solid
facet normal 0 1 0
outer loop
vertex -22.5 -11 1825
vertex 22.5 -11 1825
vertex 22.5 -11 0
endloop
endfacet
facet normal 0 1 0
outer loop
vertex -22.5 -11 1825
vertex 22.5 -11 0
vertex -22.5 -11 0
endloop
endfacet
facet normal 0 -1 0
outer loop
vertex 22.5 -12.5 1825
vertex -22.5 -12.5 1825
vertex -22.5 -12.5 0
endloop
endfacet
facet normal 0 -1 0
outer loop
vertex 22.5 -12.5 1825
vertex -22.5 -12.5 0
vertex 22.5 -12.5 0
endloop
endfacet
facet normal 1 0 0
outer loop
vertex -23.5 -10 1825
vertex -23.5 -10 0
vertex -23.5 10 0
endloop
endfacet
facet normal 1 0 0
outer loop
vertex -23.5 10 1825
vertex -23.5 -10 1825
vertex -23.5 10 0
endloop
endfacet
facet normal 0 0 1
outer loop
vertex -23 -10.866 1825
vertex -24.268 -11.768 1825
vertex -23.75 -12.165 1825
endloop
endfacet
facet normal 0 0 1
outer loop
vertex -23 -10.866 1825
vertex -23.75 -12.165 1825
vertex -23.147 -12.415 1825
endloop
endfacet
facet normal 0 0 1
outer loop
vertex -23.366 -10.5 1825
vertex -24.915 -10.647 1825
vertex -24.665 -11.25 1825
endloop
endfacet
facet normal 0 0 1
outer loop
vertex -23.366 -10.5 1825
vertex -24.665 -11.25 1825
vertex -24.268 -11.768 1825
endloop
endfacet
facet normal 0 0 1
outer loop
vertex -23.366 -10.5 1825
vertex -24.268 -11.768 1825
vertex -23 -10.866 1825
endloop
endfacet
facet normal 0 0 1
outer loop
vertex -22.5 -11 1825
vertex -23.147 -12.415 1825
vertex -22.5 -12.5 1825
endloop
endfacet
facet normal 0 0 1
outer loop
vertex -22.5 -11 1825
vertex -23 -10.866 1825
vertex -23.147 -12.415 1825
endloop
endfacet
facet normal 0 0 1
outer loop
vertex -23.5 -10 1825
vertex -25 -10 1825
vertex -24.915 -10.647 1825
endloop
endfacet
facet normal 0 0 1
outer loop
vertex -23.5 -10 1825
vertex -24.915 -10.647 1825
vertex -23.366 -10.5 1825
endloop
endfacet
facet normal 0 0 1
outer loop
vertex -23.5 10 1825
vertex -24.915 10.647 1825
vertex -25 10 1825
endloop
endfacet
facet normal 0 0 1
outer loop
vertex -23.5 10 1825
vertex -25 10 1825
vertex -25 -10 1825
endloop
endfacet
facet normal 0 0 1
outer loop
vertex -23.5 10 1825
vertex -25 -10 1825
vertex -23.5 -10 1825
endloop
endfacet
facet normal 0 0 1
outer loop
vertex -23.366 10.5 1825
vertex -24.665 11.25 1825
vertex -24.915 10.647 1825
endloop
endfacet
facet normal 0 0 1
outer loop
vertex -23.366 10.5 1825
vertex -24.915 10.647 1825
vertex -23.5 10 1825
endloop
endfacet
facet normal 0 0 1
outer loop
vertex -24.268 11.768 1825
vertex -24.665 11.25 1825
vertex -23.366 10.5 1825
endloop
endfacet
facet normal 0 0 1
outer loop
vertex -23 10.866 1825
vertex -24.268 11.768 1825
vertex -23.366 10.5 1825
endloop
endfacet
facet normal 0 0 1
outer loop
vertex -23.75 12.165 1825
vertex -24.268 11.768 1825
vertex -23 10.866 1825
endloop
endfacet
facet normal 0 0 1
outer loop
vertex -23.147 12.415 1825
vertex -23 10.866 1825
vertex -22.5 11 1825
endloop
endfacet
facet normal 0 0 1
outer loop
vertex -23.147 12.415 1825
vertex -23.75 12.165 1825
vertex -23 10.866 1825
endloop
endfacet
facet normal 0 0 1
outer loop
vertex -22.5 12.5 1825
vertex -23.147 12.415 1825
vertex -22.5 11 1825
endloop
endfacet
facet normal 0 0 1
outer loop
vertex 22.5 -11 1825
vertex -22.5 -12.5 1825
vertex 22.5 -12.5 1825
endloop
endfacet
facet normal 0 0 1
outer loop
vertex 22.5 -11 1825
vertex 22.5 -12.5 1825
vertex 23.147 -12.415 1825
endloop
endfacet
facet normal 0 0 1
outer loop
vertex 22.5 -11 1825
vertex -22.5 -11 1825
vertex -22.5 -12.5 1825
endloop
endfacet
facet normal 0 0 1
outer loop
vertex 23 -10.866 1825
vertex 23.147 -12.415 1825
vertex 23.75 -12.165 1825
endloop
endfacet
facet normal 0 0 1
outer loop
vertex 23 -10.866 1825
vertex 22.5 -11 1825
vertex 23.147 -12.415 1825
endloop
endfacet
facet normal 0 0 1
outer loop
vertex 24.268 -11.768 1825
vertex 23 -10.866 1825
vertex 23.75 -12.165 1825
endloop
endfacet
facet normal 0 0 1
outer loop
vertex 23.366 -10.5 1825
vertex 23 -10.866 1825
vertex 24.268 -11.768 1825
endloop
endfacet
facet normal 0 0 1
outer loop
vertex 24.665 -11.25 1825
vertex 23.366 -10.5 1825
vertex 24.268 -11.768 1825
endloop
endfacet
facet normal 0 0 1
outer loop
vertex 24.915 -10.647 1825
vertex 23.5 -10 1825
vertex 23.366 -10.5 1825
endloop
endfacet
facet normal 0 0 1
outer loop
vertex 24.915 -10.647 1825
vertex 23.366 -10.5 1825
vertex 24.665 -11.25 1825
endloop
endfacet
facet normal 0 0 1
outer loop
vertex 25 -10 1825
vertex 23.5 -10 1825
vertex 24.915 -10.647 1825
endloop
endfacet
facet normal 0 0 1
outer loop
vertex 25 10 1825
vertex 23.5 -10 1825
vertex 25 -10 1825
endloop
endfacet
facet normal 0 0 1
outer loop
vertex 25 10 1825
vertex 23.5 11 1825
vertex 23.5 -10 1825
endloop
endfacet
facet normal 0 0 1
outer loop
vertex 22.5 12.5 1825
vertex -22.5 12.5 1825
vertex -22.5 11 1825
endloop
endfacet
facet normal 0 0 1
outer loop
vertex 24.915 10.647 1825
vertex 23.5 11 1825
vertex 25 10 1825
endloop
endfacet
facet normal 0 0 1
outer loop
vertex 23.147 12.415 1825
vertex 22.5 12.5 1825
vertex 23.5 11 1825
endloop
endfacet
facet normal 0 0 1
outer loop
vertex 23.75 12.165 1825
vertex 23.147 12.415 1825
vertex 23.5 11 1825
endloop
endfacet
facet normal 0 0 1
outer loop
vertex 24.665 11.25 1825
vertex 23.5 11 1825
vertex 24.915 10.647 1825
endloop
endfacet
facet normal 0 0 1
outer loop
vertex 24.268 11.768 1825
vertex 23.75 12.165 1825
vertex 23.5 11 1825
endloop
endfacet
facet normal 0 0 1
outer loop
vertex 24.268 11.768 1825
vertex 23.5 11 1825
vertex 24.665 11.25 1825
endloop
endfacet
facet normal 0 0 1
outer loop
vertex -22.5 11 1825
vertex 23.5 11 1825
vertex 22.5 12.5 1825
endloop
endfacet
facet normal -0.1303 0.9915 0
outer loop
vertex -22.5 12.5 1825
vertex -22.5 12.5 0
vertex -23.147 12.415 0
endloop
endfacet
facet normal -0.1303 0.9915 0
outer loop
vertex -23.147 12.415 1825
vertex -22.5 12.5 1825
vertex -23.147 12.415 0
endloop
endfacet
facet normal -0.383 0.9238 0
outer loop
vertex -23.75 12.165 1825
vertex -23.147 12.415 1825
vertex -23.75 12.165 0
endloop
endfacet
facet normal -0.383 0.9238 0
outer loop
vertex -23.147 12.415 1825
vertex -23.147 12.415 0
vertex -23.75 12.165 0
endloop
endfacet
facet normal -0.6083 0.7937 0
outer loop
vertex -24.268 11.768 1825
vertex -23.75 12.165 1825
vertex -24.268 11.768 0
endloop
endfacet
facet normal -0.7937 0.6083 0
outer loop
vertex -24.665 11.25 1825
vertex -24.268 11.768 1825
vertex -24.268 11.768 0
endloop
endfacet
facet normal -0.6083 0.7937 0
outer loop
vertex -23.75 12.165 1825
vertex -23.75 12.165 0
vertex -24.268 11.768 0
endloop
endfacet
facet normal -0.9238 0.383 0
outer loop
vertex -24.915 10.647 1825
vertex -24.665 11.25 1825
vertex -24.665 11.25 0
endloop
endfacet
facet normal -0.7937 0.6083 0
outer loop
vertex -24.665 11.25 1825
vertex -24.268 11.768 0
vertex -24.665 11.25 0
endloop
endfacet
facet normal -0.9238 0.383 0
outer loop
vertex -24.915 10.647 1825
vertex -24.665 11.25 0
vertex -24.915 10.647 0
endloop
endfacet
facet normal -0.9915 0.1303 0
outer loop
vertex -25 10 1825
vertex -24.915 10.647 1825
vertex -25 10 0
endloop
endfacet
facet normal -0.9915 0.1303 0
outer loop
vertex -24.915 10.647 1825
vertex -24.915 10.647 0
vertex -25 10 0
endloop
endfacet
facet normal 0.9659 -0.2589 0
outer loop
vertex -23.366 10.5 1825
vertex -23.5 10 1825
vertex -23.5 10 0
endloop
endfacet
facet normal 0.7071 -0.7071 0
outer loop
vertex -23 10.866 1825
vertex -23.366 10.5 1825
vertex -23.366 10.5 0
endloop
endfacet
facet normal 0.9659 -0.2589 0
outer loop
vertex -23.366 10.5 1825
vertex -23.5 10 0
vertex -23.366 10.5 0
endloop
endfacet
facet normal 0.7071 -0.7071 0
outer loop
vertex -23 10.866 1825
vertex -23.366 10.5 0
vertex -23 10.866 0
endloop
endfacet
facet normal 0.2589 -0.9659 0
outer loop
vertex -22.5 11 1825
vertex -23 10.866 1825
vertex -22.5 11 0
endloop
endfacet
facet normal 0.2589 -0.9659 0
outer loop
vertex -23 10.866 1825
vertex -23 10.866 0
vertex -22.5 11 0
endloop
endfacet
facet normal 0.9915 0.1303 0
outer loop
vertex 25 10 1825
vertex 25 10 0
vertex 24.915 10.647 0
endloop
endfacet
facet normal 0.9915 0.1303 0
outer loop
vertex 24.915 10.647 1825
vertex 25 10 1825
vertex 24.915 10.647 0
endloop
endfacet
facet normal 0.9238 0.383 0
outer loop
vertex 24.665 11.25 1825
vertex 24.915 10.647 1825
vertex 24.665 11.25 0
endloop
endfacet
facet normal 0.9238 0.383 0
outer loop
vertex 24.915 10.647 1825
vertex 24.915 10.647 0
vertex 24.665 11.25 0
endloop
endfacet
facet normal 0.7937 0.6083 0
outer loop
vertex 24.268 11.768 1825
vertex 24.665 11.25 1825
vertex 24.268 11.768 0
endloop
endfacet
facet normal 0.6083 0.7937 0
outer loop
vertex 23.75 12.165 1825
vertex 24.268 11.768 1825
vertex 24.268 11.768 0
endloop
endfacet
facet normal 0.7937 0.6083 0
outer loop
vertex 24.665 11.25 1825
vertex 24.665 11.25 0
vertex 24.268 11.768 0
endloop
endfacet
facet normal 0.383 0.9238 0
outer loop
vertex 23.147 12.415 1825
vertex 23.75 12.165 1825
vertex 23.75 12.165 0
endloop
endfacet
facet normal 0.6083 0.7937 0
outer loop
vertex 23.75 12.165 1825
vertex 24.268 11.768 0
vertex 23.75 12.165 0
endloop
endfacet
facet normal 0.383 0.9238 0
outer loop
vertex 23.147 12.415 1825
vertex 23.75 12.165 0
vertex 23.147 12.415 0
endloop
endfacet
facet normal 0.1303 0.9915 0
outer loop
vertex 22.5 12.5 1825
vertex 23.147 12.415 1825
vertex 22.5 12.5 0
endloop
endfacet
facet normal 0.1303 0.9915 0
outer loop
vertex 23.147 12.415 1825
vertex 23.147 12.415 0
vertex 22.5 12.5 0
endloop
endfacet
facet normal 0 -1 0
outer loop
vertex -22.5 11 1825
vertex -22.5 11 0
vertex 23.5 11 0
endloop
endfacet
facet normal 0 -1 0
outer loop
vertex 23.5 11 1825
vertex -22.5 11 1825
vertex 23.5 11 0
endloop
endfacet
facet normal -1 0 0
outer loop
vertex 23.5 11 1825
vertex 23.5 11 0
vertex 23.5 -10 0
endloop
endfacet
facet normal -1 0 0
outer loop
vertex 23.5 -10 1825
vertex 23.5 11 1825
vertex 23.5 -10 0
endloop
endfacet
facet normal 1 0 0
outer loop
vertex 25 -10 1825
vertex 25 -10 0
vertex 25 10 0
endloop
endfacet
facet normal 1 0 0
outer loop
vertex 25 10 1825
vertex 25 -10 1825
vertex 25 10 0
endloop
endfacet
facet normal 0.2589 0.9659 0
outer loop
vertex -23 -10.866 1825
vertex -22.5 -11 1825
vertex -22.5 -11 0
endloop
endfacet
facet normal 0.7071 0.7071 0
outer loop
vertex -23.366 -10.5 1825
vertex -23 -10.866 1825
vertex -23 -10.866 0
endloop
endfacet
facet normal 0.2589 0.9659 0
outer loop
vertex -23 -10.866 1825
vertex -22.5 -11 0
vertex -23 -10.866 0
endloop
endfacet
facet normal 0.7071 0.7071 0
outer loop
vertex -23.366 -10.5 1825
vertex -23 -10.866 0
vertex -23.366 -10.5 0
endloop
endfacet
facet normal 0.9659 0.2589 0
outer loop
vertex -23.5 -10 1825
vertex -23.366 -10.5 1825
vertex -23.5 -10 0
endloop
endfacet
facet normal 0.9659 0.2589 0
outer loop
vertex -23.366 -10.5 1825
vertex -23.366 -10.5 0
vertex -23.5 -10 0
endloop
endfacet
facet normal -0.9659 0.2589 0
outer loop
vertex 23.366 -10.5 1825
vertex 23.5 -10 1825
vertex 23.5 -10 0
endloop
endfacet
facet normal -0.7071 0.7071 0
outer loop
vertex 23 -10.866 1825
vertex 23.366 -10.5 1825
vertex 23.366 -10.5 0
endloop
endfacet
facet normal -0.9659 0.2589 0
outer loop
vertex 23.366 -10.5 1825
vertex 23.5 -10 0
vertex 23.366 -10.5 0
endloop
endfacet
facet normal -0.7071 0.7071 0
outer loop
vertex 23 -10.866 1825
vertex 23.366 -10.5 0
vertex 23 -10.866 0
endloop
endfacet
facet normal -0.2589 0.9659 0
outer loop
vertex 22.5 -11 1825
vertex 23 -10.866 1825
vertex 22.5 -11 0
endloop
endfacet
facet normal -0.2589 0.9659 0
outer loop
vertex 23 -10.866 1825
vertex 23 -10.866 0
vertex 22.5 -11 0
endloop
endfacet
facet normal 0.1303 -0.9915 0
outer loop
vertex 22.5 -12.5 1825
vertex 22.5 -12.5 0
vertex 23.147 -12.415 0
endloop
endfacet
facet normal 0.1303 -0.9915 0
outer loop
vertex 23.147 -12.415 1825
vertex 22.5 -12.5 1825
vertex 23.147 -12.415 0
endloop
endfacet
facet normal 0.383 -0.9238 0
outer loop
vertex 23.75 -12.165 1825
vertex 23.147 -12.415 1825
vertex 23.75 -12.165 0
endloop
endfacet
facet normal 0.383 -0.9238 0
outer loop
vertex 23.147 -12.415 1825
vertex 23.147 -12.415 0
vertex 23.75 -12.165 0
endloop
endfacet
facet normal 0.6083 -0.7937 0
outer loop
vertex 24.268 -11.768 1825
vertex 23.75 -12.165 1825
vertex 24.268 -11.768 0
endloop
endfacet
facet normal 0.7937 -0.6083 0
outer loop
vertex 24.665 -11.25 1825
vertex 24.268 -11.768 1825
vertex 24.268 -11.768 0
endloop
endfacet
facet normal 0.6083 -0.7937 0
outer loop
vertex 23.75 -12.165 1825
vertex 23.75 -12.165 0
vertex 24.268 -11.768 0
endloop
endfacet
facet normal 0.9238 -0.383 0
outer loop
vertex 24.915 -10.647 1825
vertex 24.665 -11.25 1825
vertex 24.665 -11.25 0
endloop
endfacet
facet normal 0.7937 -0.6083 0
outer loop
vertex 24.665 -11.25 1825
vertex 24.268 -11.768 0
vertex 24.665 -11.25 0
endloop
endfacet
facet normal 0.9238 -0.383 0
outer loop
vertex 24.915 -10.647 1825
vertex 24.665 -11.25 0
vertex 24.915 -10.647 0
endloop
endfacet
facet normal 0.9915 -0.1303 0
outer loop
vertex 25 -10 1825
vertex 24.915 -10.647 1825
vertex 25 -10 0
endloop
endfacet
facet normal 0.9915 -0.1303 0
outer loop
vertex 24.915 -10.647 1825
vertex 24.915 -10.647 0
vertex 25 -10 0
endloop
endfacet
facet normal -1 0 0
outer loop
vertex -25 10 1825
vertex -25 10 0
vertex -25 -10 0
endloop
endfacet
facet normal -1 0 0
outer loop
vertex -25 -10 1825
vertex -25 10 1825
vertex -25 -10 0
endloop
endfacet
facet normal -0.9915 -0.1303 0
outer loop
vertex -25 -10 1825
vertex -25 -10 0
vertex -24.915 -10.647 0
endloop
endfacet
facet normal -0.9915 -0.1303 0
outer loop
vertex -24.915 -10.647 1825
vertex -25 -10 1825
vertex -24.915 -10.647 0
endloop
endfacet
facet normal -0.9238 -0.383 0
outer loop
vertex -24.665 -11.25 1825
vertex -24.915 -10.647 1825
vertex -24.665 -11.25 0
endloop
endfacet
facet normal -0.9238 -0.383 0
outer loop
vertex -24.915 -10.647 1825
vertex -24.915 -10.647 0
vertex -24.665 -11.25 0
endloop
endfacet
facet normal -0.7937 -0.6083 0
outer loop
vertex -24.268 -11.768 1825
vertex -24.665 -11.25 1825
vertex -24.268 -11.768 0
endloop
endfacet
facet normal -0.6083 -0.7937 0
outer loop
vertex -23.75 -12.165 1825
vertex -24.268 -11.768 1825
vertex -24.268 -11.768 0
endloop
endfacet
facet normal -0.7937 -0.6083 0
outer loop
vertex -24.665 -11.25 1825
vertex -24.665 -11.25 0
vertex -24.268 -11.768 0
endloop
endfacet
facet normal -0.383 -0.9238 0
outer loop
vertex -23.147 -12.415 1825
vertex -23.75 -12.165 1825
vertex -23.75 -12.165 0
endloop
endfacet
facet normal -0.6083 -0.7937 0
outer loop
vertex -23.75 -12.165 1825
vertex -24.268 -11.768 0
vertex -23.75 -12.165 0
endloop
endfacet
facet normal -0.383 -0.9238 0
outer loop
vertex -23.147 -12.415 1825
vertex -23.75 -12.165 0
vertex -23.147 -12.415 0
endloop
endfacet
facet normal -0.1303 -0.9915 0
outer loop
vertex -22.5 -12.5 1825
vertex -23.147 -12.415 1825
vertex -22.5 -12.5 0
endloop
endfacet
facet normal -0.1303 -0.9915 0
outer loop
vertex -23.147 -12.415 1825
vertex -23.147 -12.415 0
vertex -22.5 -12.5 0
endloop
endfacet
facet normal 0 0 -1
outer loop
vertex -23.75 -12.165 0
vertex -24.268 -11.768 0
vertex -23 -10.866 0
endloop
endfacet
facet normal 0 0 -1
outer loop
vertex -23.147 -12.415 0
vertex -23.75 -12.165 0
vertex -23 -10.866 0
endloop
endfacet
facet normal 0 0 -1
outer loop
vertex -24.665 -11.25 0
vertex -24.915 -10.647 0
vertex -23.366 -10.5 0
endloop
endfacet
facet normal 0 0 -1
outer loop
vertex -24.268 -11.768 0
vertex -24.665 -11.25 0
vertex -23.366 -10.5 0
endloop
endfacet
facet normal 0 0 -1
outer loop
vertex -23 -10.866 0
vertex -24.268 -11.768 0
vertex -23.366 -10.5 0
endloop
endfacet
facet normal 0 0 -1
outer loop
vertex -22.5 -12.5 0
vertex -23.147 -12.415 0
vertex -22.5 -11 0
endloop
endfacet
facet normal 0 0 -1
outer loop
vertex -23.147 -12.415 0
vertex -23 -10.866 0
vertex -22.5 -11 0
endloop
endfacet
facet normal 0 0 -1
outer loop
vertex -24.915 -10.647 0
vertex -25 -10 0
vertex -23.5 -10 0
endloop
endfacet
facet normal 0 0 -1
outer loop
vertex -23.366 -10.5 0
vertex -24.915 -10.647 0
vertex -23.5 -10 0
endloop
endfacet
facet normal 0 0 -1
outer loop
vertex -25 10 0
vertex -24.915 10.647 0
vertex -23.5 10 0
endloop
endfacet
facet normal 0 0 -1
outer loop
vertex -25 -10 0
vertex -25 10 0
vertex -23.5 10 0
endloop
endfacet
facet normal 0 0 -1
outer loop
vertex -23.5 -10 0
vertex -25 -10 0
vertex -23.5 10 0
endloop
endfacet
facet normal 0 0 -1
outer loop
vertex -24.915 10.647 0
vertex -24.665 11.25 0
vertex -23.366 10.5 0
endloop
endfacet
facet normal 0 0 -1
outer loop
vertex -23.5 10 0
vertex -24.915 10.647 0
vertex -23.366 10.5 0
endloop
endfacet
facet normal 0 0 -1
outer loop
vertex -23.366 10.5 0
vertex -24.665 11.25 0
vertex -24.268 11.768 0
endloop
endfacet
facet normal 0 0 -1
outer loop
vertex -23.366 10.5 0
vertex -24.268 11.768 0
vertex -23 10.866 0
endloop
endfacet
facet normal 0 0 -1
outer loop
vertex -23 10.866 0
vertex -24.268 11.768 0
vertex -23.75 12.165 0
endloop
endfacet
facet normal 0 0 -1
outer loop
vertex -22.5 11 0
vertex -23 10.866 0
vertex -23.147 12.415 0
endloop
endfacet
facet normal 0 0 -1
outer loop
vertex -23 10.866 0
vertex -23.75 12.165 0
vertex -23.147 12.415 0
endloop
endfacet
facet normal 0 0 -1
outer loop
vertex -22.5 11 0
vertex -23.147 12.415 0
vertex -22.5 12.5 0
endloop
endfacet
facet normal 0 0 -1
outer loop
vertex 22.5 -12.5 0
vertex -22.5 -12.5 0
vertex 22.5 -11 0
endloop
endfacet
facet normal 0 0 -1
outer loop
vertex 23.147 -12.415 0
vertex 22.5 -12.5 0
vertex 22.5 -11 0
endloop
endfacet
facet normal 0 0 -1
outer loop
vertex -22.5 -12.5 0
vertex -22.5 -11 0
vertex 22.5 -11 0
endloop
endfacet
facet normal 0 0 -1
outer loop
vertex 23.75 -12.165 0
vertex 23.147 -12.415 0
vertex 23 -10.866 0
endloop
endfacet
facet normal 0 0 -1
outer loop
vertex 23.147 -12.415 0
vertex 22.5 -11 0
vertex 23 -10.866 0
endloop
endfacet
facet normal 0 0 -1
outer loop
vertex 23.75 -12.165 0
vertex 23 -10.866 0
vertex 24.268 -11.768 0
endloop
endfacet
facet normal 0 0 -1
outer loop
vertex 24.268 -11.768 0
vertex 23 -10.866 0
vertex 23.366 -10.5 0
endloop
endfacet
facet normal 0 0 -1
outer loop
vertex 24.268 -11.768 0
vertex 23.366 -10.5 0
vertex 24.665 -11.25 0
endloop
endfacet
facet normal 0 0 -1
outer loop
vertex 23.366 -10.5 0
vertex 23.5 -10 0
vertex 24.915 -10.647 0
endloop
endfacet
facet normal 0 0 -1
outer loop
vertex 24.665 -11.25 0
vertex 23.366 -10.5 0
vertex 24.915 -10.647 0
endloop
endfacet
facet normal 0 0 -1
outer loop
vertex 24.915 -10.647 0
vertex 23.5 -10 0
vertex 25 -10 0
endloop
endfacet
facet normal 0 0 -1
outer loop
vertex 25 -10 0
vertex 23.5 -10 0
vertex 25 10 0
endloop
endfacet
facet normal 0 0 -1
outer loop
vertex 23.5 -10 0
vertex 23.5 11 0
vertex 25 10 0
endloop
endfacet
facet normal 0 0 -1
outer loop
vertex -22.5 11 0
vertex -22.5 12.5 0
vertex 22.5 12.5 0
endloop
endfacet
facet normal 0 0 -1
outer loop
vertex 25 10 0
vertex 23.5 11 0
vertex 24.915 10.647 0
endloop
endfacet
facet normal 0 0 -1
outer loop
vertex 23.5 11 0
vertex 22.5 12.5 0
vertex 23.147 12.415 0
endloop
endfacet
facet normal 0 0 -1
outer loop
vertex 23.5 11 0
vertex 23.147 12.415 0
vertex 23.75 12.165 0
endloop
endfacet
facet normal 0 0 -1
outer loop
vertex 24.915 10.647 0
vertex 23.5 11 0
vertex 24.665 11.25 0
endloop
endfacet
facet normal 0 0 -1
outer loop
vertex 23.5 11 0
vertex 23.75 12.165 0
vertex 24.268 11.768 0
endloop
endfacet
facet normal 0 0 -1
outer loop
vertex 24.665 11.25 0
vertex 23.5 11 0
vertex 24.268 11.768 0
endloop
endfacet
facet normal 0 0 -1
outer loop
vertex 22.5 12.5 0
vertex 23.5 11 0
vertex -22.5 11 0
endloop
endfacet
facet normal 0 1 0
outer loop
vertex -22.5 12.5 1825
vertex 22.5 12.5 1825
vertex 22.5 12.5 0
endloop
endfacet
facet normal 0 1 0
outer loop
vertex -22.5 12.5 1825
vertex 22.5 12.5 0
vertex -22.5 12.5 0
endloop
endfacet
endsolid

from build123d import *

# Parameters (mm, degrees)
F1_DEPTH = 1825


with BuildPart() as f1:
    # F0 (on Top) → F1 (new body)
    with BuildSketch(Plane.XY):
        with BuildLine():
            ThreePointArc((25, 10), (24.267767, 11.767767), (22.5, 12.5))
            Line((22.5, 12.5), (-22.5, 12.5))
            ThreePointArc((-22.5, 12.5), (-24.267767, 11.767767), (-25, 10))
            Line((-25, 10), (-25, -10))
            ThreePointArc((-25, -10), (-24.267767, -11.767767), (-22.5, -12.5))
            Line((-22.5, -12.5), (22.5, -12.5))
            ThreePointArc((22.5, -12.5), (24.267767, -11.767767), (25, -10))
            Line((25, -10), (25, 10))
        make_face()
        with BuildLine():
            ThreePointArc((23.5, -10), (23.207107, -10.707107), (22.5, -11))
            Line((22.5, -11), (-22.5, -11))
            ThreePointArc((-22.5, -11), (-23.207107, -10.707107), (-23.5, -10))
            Line((-23.5, -10), (-23.5, 10))
            ThreePointArc((-23.5, 10), (-23.207107, 10.707107), (-22.5, 11))
            Line((-22.5, 11), (23.5, 11))
            Line((23.5, 11), (23.5, -10))
        make_face(mode=Mode.SUBTRACT)
    extrude(amount=F1_DEPTH)


solid = f1.part
